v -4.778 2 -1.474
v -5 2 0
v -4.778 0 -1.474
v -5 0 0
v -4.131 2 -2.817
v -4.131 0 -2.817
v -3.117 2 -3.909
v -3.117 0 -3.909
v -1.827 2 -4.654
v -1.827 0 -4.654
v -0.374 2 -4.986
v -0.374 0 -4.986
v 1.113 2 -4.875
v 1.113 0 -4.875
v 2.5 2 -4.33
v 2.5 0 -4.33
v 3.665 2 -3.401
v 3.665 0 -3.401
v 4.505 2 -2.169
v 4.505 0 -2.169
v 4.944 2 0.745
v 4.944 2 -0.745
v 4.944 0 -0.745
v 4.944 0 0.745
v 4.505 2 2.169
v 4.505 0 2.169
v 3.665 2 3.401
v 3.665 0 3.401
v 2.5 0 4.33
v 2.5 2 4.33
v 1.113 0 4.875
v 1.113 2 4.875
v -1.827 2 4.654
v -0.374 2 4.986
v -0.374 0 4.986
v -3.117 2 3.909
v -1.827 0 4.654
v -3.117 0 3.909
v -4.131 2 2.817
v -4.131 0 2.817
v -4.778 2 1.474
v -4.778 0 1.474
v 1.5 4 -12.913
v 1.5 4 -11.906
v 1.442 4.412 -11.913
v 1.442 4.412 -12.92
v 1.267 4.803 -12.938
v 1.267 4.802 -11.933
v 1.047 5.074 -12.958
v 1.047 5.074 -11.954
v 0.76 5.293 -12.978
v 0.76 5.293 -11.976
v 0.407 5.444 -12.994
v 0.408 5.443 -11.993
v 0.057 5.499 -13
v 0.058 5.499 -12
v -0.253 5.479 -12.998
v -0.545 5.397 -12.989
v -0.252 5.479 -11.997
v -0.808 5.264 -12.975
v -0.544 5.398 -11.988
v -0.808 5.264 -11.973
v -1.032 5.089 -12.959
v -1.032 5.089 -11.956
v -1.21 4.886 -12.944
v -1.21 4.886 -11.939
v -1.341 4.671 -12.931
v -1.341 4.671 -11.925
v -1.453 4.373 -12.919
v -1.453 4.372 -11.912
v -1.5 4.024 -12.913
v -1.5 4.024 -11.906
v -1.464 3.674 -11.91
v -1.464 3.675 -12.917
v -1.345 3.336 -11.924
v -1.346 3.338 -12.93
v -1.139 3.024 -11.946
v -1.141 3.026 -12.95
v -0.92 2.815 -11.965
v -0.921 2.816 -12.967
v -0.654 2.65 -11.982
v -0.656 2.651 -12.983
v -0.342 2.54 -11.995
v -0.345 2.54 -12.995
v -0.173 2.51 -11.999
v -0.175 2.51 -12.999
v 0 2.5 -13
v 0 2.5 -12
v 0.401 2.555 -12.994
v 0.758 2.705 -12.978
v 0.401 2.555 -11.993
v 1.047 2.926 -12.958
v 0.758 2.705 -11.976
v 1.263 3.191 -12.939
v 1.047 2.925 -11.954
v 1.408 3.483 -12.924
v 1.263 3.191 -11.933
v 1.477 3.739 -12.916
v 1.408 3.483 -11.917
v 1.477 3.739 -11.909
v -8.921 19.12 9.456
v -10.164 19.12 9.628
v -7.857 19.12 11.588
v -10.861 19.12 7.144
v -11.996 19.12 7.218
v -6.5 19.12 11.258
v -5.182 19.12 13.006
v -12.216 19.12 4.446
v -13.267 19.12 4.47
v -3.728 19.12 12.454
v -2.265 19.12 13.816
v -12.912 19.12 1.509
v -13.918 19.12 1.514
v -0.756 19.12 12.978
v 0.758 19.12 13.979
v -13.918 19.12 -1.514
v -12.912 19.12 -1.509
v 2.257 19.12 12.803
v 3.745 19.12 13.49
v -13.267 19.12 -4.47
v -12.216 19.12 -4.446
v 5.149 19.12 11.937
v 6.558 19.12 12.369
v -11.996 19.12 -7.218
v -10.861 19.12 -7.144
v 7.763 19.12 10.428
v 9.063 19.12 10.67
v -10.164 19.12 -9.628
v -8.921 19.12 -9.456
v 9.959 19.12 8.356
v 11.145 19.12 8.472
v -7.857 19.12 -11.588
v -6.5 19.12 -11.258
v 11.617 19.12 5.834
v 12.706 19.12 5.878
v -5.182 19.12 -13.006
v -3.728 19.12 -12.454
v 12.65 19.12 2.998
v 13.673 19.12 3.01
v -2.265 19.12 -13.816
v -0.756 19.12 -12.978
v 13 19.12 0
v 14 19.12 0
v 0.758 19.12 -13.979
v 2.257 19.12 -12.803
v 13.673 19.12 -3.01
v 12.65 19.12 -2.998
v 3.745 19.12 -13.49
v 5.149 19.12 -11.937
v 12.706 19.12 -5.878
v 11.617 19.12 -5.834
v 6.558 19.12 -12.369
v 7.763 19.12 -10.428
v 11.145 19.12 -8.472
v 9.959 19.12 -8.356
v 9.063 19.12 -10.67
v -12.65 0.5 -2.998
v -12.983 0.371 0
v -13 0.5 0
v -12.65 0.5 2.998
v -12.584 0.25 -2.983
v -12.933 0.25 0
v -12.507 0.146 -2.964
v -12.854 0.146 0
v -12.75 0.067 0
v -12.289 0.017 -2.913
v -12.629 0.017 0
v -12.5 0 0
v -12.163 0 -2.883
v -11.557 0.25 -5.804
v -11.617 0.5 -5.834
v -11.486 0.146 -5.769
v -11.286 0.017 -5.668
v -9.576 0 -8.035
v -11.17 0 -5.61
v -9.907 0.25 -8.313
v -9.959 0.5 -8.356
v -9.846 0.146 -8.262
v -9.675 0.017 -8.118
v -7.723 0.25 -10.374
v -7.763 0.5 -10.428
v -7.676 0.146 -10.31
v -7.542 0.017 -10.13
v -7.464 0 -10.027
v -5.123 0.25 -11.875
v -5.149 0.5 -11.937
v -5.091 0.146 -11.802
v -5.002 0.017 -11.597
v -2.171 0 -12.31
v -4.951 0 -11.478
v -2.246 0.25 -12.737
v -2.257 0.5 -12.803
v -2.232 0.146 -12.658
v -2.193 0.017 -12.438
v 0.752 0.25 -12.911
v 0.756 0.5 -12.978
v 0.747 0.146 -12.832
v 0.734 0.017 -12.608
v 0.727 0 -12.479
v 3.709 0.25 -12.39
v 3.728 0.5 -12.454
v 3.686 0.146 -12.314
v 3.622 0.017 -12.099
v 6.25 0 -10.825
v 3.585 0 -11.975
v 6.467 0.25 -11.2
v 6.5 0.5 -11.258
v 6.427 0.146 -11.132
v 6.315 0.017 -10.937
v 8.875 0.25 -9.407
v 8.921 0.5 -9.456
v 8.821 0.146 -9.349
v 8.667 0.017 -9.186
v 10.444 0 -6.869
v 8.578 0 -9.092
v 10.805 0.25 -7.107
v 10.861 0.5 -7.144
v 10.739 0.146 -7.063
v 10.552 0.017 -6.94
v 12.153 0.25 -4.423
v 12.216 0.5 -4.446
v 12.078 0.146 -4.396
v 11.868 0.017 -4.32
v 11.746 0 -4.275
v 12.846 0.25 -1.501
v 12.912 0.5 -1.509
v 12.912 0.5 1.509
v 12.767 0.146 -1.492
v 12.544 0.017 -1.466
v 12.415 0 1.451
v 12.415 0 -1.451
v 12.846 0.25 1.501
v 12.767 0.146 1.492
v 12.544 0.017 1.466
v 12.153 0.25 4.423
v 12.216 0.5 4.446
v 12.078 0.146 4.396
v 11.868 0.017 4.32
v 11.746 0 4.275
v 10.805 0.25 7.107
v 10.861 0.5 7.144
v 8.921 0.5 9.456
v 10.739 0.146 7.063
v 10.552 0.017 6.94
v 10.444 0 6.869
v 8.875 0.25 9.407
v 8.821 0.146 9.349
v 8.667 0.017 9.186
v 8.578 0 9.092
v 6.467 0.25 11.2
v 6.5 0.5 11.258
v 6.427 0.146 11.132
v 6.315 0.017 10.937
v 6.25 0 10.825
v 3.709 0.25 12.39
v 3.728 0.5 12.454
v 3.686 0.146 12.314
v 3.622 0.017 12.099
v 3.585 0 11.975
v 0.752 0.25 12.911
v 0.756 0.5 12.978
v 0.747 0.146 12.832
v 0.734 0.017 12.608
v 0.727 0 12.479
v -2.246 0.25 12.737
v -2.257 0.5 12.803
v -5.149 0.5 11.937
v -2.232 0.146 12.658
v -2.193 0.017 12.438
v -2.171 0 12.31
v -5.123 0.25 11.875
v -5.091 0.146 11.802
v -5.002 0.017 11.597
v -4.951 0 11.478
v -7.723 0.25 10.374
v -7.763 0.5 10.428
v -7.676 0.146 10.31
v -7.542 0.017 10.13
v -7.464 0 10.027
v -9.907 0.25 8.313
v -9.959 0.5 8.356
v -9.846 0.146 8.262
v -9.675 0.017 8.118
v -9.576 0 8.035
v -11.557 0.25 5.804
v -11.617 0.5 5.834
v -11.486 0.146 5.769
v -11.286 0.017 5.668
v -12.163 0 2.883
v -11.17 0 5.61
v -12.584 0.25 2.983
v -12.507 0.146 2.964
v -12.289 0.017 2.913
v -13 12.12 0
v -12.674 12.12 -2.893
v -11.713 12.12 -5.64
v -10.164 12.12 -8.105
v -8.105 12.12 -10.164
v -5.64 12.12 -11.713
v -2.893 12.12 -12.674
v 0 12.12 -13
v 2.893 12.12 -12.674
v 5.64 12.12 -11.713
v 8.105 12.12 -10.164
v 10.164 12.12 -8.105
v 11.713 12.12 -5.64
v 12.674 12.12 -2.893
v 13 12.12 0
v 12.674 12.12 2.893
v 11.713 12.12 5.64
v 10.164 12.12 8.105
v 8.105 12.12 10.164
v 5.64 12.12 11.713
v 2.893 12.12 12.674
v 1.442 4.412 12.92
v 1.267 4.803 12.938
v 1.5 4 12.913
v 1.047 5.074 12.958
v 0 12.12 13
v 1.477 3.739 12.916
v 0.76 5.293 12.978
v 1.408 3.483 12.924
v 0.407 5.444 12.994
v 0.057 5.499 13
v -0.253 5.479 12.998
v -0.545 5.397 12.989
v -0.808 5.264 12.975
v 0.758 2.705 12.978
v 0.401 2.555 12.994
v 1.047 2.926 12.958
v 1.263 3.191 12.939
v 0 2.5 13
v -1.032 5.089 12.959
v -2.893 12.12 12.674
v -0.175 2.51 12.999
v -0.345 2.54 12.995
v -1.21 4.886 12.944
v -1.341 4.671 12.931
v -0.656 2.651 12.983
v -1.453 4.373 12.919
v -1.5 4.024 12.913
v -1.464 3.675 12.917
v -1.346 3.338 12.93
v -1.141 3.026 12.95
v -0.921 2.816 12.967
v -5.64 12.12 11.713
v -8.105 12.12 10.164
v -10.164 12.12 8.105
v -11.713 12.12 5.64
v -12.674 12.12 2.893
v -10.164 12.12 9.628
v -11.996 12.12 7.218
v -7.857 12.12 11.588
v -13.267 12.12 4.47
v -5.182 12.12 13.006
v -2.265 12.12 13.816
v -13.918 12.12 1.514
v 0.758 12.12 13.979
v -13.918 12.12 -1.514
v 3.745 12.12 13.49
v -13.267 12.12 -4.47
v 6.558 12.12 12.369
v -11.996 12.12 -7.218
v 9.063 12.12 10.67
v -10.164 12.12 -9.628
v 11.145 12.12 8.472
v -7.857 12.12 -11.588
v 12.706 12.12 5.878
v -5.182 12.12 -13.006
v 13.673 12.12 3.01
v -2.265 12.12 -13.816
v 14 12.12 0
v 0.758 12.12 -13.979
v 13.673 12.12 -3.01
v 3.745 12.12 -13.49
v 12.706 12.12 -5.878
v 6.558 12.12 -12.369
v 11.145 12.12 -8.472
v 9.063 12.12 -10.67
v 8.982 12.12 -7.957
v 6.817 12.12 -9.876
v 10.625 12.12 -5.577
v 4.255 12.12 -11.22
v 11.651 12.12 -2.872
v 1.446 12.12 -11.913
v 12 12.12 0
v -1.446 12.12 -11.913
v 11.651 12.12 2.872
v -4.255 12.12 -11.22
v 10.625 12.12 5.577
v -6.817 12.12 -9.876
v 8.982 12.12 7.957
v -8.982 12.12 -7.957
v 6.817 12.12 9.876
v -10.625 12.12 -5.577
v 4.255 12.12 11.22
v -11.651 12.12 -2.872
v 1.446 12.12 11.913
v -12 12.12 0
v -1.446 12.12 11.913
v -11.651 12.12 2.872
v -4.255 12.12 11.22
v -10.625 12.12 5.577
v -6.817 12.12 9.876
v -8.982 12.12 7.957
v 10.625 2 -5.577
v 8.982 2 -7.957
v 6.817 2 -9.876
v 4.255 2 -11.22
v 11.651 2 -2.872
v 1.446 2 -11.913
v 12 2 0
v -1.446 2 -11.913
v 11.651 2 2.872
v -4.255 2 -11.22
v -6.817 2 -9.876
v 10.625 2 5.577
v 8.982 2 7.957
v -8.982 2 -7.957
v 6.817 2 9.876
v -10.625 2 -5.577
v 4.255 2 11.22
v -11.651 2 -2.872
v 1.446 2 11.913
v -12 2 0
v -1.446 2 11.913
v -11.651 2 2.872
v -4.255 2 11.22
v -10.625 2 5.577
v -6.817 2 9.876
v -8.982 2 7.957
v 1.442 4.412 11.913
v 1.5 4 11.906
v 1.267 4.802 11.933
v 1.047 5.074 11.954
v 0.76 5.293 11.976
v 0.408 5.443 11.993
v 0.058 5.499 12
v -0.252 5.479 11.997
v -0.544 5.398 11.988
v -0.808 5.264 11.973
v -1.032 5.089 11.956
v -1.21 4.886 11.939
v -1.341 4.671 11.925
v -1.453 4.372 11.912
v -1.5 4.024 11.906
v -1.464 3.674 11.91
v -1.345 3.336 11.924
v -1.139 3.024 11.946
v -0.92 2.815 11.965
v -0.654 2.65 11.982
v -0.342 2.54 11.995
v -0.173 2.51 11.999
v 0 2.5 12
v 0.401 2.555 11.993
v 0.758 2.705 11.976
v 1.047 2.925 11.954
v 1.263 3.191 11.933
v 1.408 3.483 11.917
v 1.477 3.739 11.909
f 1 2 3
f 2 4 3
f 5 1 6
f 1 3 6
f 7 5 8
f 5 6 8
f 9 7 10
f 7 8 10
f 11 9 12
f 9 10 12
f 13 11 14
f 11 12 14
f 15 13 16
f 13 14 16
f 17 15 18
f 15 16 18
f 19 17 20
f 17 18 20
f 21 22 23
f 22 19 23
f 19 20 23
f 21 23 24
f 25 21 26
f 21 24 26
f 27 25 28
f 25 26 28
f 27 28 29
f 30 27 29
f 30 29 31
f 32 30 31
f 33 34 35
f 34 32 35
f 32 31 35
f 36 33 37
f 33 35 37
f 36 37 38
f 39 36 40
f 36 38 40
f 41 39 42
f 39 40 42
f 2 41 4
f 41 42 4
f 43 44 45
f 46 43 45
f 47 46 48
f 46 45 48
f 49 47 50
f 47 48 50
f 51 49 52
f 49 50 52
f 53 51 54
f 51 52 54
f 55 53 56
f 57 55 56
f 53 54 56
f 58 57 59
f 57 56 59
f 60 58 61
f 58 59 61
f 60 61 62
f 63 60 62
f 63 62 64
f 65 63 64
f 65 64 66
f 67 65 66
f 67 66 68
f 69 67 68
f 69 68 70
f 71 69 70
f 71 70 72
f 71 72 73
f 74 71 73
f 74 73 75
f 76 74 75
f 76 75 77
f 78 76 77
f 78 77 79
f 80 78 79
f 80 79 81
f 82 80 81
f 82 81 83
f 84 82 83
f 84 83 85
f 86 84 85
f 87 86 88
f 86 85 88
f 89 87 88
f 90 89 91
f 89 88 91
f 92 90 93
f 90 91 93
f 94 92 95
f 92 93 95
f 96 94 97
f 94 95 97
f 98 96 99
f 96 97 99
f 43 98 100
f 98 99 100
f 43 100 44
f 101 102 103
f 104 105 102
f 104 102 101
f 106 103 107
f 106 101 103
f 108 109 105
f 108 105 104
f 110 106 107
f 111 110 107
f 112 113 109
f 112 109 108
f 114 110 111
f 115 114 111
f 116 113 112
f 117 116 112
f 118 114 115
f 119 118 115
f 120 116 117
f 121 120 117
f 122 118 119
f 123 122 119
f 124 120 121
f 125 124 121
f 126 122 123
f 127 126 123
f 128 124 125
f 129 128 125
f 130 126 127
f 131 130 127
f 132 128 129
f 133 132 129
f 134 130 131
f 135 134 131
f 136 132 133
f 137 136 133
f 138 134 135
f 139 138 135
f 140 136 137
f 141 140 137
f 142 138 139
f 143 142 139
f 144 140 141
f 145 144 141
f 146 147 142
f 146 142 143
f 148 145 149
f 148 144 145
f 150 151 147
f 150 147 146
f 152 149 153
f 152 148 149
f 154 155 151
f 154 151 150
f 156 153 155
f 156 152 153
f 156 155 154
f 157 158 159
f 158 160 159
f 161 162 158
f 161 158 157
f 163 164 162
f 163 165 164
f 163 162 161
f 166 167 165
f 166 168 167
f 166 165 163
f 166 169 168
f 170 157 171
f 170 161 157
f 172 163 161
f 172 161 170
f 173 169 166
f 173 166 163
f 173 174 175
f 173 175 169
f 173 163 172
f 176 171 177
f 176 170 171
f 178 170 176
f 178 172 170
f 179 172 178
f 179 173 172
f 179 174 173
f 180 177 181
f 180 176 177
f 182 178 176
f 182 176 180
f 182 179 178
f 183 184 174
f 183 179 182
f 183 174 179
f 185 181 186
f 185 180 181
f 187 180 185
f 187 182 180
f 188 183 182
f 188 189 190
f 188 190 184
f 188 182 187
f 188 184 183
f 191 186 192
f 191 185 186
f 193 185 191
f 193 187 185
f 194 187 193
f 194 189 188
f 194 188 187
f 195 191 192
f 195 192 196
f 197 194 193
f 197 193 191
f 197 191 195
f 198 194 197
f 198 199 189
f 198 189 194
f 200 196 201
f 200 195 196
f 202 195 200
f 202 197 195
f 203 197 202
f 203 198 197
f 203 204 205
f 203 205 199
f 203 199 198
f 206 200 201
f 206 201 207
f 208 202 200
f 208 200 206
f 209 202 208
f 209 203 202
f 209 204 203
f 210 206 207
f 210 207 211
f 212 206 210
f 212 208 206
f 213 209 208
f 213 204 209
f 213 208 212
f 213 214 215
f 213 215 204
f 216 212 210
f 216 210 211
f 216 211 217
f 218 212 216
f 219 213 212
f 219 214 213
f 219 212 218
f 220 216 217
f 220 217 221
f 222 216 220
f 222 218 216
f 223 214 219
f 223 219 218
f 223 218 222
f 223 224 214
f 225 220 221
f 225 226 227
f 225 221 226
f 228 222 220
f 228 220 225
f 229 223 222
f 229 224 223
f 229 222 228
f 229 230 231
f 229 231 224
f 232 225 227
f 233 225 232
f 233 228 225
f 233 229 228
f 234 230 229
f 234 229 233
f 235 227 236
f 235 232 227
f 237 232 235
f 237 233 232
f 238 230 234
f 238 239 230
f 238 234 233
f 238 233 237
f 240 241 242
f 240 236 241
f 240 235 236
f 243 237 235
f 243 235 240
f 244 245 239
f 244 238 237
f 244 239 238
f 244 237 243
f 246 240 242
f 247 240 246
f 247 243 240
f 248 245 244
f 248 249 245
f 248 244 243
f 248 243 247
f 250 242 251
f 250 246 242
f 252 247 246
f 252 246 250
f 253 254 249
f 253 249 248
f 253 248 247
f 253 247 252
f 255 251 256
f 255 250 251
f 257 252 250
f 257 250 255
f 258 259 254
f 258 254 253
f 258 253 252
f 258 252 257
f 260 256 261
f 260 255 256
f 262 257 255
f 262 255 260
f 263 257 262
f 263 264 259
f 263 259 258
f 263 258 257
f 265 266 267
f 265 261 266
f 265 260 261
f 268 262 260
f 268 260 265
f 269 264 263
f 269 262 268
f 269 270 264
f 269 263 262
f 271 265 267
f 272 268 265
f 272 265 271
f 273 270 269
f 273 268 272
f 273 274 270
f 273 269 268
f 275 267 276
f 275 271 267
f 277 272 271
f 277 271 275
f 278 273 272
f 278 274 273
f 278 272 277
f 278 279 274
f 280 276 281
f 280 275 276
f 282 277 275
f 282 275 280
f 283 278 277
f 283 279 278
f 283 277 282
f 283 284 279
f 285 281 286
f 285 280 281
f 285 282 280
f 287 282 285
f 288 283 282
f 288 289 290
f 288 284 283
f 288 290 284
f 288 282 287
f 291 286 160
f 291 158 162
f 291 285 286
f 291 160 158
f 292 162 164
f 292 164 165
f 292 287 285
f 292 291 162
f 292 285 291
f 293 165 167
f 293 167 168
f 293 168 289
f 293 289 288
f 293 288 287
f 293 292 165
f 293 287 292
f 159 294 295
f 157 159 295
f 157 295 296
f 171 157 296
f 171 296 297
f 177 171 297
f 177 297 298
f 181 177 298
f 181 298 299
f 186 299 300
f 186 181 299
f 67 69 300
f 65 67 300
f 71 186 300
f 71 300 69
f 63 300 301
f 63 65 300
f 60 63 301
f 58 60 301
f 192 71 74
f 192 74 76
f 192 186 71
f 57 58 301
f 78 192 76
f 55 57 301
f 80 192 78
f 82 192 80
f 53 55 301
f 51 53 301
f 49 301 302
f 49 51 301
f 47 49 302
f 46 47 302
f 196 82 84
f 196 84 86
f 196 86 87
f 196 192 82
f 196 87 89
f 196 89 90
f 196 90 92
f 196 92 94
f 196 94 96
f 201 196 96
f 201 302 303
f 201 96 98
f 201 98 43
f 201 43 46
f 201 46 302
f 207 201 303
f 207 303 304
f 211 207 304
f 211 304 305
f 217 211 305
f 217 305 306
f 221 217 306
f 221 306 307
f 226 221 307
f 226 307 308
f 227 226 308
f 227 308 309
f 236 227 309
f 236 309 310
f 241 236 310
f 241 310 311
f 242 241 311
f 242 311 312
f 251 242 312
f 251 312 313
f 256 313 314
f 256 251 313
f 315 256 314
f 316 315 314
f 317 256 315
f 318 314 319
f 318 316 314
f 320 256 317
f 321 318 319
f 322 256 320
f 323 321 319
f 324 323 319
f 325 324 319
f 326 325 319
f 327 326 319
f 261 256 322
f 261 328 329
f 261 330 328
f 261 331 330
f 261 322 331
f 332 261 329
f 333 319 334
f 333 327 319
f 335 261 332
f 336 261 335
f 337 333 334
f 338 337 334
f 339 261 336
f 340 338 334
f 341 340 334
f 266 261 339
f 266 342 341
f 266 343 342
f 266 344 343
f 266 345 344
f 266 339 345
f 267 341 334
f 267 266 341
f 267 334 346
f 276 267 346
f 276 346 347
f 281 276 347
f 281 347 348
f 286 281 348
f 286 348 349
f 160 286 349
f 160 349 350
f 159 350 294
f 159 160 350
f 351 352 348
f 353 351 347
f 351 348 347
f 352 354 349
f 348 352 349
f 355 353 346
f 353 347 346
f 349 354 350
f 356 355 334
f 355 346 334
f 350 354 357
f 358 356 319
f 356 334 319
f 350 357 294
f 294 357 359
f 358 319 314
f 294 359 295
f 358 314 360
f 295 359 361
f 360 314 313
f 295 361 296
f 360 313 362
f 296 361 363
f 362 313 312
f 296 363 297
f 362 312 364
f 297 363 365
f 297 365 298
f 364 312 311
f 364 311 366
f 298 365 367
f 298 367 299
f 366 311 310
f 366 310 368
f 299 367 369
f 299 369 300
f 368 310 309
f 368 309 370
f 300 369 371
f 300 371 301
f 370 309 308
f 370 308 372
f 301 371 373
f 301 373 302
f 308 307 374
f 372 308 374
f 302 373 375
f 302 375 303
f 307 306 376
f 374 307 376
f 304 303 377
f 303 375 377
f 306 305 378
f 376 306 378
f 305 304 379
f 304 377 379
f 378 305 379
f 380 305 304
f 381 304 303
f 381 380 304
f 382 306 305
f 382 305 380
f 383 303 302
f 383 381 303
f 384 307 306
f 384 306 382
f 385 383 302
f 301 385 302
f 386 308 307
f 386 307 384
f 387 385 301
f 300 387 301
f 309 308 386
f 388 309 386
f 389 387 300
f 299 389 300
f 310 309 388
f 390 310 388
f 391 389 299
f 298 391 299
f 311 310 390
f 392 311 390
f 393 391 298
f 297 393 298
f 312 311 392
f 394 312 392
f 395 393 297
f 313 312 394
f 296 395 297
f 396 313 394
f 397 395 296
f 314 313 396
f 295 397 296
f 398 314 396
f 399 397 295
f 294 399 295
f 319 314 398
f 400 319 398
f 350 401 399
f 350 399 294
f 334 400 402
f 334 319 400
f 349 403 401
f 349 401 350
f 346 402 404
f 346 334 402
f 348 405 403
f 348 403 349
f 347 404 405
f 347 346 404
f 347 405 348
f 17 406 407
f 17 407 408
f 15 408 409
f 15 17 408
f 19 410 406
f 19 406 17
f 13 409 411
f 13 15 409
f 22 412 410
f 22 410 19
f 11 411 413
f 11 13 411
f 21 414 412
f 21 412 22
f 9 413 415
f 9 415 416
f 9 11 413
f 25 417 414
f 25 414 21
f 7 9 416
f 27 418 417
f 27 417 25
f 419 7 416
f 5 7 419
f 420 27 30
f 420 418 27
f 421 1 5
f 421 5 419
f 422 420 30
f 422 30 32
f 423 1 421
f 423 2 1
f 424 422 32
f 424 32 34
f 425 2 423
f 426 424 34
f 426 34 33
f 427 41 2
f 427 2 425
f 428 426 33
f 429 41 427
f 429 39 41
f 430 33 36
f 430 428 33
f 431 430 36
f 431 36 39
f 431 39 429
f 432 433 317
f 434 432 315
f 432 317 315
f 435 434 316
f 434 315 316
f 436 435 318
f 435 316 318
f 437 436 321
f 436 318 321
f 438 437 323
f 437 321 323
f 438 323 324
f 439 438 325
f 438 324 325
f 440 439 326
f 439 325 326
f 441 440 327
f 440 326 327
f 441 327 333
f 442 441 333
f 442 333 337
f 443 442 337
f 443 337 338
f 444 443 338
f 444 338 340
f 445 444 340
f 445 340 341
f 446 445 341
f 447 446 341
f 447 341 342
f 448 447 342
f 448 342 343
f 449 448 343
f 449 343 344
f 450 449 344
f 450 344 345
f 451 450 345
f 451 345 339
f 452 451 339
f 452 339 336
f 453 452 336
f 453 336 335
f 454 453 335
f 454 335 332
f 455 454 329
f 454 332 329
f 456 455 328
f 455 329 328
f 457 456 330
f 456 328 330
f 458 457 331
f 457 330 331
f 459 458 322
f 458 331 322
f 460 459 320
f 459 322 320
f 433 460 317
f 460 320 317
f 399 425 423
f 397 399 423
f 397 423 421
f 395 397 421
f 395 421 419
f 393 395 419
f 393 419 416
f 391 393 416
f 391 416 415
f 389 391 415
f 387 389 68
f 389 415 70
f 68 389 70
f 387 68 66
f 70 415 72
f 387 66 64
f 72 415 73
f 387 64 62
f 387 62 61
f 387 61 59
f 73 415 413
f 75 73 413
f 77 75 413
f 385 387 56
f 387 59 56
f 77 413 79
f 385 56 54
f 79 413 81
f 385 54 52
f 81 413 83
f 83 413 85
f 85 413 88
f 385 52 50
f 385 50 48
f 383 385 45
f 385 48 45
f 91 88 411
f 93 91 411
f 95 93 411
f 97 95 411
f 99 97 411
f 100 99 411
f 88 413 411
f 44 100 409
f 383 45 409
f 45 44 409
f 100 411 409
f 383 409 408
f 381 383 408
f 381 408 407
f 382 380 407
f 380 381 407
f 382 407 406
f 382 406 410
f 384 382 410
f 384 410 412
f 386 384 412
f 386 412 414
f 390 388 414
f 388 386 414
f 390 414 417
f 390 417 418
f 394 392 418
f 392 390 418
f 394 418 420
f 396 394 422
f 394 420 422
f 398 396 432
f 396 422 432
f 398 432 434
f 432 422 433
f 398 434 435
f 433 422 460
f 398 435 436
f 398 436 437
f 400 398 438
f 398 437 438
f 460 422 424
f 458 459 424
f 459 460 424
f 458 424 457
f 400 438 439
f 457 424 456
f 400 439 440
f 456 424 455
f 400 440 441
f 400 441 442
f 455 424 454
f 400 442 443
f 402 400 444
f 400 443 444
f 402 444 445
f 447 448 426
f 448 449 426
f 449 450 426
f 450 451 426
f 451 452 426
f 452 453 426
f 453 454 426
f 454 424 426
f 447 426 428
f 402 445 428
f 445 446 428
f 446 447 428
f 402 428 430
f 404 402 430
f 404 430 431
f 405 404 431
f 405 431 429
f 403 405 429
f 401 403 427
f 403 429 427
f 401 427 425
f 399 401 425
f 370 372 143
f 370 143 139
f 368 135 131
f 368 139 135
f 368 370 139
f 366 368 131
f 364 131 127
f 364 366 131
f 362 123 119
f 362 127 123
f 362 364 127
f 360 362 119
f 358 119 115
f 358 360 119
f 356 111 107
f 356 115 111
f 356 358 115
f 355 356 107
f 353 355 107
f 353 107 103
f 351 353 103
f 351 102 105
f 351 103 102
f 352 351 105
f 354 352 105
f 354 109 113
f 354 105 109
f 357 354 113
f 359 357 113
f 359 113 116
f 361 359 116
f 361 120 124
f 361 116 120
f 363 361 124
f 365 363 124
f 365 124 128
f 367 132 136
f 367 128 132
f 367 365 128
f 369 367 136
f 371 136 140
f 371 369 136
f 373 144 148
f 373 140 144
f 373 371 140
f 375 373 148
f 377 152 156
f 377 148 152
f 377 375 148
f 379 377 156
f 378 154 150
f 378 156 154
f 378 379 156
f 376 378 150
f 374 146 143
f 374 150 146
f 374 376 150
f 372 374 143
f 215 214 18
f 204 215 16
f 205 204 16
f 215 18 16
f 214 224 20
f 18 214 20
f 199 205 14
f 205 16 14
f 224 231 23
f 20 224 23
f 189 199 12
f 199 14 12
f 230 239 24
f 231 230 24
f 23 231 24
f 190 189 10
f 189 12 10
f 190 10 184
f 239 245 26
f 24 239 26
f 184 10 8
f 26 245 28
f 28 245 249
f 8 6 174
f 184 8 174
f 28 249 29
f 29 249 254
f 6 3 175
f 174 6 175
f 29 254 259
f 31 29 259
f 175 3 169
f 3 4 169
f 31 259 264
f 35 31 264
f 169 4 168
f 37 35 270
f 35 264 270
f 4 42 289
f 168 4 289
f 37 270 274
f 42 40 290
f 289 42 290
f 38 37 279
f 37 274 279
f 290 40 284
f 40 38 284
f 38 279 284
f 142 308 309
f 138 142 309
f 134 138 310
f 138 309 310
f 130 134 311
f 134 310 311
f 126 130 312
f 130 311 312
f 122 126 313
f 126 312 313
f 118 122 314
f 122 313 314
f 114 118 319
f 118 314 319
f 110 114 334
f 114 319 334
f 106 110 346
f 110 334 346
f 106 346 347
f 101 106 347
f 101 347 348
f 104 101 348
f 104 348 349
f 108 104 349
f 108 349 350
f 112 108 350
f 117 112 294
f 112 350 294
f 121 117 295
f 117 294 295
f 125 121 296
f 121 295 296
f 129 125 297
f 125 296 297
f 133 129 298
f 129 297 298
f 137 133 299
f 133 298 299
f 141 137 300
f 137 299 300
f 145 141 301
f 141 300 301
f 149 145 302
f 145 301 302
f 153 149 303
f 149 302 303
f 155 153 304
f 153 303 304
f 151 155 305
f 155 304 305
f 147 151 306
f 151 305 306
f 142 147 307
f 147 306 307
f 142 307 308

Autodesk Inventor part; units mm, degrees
ref_plane "YZ Plane" through (0, 0, 0) normal (1, 0, 0) x (0, 1, 0)
ref_plane "XZ Plane" through (0, 0, 0) normal (0, 1, 0) x (-1, 0, 0)
sketch "Sketch1" plane through (0, 0, 0) normal (0, 1, 0) x (-1, 0, 0)
  circle A0 centre (0, 0) radius 13
  circle A1 centre (0, 0) radius 12
  circle A2 centre (0, 0) radius 5
  dimension "d0" = 26
  dimension "d1" = 24
  dimension "d2" = 10
extrude "Extrusion1" add sketch "Sketch1" along normal blind 2 contours A1
extrude "Extrusion3" add sketch "Sketch1" along normal blind 12.12 contours A0
sketch "Sketch2" plane through (0, 12.12, 0) normal (0, 1, 0) x (1, 0, 0)
  circle A0 centre (0, 0) radius 14
  circle A1 centre (0, 0) radius 13
  dimension "d9" = 28
  dimension "d10" = 26
extrude "Extrusion4" add sketch "Sketch2" along normal blind 7
fillet "Fillet1" radius 0.5 1 edges at (13, 0, 0)
ref_plane "Work Plane1" through (0, 0, 14) normal (0, 0, 1) x (1, 0, 0)
sketch "Sketch3" plane through (0, 0, 14) normal (0, 0, 1) x (1, 0, 0)
  line L0 (0, 0) -> (0, 4)
  circle A0 centre (0, 4) radius 1.5
  dimension "d15" = 4
  dimension "d16" = 3
extrude "Extrusion5" cut sketch "Sketch3" against normal through all
properties part number "base_single" material "Brass, Soft Yellow, Welded"
